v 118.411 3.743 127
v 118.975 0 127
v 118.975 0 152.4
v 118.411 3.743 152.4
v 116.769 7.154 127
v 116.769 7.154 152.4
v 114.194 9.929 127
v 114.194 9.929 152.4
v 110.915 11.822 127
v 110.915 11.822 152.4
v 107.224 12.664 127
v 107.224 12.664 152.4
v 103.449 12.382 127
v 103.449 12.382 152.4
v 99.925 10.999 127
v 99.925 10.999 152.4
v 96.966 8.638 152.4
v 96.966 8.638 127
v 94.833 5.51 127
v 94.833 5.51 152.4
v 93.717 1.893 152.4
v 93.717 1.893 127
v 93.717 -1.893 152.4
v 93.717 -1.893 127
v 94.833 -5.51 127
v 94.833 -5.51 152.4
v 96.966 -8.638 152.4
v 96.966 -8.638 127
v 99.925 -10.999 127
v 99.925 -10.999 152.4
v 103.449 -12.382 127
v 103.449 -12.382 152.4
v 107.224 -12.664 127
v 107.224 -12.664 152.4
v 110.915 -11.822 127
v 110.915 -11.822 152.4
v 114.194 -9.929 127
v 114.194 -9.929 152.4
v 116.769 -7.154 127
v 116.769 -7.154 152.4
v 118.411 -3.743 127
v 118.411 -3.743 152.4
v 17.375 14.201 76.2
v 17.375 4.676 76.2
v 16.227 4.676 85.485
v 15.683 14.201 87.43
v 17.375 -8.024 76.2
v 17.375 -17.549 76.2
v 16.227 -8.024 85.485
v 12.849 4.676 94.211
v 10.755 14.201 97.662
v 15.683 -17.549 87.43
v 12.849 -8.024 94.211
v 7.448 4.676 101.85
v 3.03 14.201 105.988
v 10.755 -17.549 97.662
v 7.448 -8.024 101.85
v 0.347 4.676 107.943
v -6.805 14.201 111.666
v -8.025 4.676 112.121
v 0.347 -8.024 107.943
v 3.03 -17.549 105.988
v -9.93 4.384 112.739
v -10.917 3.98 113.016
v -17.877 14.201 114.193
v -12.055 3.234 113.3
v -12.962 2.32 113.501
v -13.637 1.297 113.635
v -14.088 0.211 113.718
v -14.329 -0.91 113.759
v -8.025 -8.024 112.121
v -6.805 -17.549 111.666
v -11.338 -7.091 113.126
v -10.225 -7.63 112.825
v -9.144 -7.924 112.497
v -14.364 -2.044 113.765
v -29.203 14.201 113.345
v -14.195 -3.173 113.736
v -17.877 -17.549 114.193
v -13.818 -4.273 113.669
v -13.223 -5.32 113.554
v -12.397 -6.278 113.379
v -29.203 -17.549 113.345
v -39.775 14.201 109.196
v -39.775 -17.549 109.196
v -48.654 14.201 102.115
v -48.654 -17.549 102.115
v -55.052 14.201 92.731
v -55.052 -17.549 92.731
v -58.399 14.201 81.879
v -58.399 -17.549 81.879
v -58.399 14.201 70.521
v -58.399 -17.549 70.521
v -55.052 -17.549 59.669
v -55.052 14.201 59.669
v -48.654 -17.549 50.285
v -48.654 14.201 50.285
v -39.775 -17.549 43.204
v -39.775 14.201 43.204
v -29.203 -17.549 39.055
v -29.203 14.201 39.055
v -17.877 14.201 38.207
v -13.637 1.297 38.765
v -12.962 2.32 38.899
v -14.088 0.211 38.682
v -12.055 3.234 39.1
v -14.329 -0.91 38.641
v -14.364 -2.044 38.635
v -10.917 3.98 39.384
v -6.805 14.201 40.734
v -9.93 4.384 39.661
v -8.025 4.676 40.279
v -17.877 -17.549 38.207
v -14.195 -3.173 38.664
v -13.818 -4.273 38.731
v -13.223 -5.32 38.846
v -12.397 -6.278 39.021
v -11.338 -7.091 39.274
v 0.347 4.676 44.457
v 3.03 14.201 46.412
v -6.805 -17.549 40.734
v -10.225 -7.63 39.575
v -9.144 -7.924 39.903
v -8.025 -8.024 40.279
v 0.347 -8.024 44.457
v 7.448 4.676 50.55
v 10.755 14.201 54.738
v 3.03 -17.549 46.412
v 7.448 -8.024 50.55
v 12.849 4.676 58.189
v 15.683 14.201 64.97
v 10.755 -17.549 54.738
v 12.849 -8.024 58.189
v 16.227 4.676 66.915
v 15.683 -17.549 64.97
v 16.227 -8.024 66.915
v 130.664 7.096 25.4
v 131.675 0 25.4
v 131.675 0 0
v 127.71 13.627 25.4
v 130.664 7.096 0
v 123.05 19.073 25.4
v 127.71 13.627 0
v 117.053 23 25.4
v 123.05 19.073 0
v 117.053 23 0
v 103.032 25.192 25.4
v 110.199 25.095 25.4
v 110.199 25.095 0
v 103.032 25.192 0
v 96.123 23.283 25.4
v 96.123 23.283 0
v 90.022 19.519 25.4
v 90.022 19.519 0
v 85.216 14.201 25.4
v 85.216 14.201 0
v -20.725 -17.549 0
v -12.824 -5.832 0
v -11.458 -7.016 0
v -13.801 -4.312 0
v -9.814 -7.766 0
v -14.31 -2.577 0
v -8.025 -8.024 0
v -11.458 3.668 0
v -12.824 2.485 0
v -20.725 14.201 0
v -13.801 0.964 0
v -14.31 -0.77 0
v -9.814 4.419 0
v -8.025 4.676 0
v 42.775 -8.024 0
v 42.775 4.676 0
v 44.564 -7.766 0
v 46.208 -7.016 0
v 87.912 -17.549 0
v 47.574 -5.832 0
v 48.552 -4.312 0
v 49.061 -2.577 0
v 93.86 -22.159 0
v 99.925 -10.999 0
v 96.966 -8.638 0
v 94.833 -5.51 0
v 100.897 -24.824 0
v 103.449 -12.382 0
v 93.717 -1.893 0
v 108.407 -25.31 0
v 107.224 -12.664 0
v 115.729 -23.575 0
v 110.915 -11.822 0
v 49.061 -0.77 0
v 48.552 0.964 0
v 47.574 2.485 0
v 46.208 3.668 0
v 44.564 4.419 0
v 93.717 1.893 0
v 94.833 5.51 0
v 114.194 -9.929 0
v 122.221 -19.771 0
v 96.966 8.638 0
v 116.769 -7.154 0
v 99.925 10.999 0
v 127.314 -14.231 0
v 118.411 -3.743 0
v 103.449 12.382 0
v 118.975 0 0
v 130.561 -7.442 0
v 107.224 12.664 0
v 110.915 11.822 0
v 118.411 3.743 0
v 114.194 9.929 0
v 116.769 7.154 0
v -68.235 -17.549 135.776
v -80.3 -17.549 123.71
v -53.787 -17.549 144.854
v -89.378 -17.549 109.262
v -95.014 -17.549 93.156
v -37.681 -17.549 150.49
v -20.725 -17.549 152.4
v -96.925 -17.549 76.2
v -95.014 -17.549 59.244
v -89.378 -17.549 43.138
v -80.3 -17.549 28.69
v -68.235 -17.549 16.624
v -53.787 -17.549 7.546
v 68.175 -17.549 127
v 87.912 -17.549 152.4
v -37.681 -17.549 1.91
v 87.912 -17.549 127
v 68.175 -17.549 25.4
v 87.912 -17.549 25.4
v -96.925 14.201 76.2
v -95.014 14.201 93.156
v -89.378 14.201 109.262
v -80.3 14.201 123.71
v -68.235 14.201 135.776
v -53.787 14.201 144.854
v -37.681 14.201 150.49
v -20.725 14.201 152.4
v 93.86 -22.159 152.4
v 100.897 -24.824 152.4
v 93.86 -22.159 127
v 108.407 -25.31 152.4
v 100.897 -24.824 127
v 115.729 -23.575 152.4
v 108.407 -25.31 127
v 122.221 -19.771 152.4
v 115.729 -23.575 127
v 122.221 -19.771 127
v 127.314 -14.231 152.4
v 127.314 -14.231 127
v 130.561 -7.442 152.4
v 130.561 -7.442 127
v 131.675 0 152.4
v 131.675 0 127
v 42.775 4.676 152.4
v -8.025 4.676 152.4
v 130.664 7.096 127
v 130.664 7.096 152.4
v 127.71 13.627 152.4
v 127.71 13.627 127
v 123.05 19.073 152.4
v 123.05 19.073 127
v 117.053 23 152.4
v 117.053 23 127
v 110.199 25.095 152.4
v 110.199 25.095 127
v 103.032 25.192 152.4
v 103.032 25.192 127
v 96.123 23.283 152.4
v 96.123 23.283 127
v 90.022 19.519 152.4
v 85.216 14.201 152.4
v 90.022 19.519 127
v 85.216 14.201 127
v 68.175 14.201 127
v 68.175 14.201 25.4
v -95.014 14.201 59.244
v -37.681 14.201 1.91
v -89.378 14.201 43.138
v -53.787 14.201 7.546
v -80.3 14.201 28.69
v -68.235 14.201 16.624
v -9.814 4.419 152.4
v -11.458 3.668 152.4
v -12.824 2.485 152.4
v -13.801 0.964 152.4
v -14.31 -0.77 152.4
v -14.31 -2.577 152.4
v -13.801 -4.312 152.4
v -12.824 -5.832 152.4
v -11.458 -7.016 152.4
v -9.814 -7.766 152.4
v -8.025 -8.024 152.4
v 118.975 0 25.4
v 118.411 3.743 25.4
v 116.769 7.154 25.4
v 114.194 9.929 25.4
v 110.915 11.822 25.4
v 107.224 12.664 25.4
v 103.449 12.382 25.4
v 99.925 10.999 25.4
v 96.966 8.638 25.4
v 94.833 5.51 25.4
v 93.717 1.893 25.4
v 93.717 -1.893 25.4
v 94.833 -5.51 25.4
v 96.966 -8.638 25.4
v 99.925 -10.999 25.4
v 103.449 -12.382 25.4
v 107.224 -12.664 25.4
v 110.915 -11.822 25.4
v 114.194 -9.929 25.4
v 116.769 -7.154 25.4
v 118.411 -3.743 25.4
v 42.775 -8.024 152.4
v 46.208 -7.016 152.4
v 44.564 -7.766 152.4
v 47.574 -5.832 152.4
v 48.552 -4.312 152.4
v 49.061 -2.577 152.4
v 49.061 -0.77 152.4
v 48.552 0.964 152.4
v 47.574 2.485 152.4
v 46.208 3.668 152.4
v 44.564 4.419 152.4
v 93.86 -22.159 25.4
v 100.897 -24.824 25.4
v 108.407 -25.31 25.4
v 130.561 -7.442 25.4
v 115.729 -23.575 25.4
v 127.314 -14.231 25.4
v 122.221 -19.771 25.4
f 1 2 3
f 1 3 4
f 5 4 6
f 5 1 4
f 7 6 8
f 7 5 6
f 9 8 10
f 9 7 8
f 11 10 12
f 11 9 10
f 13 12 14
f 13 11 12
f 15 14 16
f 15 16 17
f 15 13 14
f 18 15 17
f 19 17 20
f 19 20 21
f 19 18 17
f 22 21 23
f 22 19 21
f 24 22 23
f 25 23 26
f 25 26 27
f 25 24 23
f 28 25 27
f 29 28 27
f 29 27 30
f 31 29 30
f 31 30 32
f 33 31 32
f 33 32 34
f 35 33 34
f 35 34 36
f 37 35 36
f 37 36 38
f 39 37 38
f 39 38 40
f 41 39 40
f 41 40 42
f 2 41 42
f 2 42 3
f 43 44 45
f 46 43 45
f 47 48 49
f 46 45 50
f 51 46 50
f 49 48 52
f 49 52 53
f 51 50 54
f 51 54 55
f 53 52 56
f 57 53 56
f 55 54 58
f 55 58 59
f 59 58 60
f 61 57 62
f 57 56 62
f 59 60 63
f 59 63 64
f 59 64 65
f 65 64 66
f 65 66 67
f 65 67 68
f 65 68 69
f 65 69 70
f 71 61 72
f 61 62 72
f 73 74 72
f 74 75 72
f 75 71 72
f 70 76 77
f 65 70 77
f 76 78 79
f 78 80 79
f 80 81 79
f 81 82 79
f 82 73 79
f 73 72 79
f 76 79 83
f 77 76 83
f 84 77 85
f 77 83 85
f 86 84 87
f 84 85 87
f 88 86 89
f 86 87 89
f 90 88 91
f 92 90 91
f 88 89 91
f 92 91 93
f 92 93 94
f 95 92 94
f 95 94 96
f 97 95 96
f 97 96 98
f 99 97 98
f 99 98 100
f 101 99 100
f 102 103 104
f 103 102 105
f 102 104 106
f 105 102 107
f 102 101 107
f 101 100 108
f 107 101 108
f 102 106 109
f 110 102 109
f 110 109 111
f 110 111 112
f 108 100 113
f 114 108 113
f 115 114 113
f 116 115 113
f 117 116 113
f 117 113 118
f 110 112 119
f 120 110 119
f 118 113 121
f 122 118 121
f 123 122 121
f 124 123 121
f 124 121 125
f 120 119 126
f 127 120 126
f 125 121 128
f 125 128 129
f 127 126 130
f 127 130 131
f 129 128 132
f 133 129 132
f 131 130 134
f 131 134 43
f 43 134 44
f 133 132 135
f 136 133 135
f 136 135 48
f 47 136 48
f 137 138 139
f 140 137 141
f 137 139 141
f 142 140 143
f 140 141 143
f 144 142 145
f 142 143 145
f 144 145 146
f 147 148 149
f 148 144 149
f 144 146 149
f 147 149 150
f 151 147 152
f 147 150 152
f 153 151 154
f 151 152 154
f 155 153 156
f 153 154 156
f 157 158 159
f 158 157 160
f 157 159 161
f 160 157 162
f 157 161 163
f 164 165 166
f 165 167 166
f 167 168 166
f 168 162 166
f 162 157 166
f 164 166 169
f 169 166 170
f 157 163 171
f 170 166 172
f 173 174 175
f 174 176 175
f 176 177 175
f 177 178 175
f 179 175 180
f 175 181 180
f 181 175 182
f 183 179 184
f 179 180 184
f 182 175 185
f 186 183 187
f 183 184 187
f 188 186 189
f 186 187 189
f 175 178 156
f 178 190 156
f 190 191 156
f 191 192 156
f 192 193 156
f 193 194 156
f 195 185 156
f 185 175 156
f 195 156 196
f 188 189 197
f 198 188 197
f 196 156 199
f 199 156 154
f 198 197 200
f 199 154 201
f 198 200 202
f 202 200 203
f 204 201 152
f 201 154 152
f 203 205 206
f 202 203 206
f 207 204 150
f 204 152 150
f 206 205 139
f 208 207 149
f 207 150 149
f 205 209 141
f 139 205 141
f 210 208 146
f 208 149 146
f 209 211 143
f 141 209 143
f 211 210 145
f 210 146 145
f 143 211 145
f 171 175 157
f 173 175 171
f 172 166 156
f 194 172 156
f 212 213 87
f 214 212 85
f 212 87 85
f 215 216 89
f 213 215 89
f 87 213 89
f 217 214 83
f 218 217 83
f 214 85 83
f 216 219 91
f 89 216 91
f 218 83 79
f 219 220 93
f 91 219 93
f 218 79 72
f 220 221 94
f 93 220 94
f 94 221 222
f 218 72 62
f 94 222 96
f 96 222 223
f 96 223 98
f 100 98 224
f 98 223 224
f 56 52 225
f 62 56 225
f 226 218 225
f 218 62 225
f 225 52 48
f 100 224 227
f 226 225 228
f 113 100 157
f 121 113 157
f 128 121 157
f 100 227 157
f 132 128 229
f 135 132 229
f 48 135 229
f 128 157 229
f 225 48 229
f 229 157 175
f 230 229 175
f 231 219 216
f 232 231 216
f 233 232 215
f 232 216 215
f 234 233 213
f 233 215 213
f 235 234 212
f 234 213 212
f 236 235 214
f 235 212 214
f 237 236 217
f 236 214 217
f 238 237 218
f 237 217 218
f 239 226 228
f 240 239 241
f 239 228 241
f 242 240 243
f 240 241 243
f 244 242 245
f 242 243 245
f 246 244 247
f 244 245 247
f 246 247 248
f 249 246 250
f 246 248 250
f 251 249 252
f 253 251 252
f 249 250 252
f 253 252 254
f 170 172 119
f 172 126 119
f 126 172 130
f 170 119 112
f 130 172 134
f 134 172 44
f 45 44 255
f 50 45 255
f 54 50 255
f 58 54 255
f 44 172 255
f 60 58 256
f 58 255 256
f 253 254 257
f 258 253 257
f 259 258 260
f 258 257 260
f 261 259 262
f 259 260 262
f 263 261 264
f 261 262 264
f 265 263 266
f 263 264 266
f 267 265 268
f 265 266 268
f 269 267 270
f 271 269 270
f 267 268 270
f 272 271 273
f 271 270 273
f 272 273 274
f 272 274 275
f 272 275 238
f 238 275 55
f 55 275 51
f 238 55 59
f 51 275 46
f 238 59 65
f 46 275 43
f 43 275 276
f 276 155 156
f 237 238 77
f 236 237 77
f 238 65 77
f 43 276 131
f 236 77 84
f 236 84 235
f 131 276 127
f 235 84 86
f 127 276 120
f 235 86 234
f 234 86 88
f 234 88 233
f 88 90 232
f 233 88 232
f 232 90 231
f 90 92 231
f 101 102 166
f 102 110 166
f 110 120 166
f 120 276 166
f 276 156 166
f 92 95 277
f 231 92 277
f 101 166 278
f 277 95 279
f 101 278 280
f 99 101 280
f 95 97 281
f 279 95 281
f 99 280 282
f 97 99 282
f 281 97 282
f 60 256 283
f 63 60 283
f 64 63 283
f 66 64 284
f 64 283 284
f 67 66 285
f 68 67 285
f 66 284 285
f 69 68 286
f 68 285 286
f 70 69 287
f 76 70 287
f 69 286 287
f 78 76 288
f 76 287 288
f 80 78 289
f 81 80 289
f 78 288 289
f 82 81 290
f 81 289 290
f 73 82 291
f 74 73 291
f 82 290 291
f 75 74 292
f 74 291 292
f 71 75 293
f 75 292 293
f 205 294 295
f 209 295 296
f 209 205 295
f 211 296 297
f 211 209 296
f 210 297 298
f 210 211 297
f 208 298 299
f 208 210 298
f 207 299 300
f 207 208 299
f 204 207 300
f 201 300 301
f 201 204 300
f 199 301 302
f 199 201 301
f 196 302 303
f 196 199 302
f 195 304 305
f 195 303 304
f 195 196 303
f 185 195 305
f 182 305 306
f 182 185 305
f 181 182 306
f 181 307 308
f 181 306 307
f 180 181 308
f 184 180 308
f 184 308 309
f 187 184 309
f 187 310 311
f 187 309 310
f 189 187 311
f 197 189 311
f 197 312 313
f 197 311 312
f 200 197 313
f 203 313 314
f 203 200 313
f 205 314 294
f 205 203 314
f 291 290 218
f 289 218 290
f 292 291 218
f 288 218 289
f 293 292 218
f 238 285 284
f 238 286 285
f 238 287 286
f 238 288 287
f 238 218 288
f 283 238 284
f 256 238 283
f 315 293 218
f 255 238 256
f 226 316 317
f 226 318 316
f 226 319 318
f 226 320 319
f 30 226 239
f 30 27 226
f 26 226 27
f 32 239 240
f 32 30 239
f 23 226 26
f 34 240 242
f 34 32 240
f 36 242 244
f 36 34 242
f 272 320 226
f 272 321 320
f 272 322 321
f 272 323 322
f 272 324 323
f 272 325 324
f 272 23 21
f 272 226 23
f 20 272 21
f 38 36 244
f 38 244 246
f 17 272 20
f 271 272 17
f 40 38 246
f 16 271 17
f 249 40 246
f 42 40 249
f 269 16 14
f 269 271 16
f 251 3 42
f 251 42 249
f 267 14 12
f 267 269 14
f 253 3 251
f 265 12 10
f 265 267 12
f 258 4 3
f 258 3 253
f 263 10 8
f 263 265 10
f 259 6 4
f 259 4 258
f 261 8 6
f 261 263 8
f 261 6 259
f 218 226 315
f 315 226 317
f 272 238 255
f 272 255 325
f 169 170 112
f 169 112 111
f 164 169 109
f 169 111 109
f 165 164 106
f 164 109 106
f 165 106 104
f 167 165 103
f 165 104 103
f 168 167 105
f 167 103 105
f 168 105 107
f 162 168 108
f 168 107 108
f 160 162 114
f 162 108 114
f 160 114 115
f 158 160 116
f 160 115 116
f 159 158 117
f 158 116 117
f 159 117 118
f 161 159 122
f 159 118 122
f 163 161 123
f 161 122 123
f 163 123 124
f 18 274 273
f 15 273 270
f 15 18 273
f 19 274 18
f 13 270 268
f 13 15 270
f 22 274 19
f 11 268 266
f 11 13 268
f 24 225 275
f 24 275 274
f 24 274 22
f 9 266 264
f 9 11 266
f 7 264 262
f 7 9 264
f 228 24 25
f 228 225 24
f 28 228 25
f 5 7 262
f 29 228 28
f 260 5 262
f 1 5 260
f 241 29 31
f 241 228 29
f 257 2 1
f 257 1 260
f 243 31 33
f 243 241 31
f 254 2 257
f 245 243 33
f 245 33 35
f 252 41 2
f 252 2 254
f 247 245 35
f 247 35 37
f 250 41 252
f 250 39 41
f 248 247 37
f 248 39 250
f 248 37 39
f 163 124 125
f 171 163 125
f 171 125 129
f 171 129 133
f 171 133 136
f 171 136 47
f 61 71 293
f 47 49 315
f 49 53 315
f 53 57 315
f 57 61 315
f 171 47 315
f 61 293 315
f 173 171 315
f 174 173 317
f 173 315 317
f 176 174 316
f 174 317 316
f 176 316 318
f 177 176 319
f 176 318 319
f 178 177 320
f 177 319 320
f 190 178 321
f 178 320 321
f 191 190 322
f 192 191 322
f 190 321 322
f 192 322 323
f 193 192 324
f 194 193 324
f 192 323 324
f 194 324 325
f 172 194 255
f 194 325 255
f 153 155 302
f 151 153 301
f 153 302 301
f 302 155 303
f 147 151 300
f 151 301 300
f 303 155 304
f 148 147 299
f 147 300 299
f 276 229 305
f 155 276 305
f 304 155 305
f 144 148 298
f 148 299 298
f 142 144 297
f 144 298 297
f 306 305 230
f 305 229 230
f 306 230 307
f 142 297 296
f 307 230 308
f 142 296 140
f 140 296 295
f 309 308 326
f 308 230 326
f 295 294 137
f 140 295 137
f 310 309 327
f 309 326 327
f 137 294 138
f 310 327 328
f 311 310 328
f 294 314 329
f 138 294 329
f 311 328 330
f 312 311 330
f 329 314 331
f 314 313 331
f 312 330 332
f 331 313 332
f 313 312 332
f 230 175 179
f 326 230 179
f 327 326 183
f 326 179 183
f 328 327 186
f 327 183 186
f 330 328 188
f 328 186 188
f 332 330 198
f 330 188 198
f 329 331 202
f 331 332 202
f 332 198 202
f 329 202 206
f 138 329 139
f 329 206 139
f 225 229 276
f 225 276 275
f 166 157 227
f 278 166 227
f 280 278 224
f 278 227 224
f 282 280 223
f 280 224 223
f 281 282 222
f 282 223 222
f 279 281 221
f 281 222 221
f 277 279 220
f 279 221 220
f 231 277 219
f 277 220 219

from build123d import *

# Parameters (mm, degrees)
F0_R     = 12.7
F1_DEPTH = 152.4
F2_R     = 38.1
F3_DEPTH = 42.949663
F5_DEPTH = 152.401
F6_W     = 157.67442
F6_H     = 101.6
F7_DEPTH = 838.2


with BuildPart() as f1:
    # F0 (on Top) → F1 (new body)
    with BuildSketch(Plane.XY):
        with BuildLine():
            ThreePointArc((87.912252, -17.548663), (115.728859, -23.575235), (131.675379, 0))
            ThreePointArc((131.675379, 0), (113.700373, 24.290522), (85.216366, 14.201337))
            ThreePointArc((85.216366, 14.201337), (80.96645, -2.148976), (87.912252, -17.548663))
        make_face()
        with Locations((106.275379, 0)):
            Circle(F0_R, mode=Mode.SUBTRACT)
        with BuildLine():
            ThreePointArc((87.912252, -17.548663), (80.96645, -2.148976), (85.216366, 14.201337))
            Line((85.216366, 14.201337), (-96.924621, 14.201337))
            Line((-96.924621, 14.201337), (-96.924621, -17.548663))
            Line((-96.924621, -17.548663), (87.912252, -17.548663))
        make_face()
    extrude(amount=F1_DEPTH)

    # F2 (on face) → F3 (cut, through all)
    with BuildSketch(Plane.XZ.offset(17.548663)):
        with BuildLine():
            ThreePointArc((-96.924621, 76.2), (-74.606158, 130.081537), (-20.724621, 152.4))
            Line((-20.724621, 152.4), (-96.924621, 152.4))
            Line((-96.924621, 152.4), (-96.924621, 76.2))
        make_face()
        with BuildLine():
            ThreePointArc((-20.724621, 0), (-74.606158, 22.318463), (-96.924621, 76.2))
            Line((-96.924621, 76.2), (-96.924621, 0))
            Line((-96.924621, 0), (-20.724621, 0))
        make_face()
        Polygon((-96.924621, 0), (-96.924621, 76.2), (-96.924621, 152.4), (-108.673256, 152.4), (-108.673256, 0), align=None)
        with Locations((-20.724621, 76.2)):
            Circle(F2_R)
    extrude(amount=-F3_DEPTH, mode=Mode.SUBTRACT)

    # F4 (on face) → F5 (cut, through all)
    with BuildSketch(Plane.XY.offset(152.4)):
        with BuildLine():
            Line((-8.024621, -8.023663), (42.775379, -8.023663))
            ThreePointArc((42.775379, -8.023663), (49.125379, -1.673663), (42.775379, 4.676337))
            Line((42.775379, 4.676337), (-8.024621, 4.676337))
            ThreePointArc((-8.024621, 4.676337), (-14.374621, -1.673663), (-8.024621, -8.023663))
        make_face()
    extrude(amount=-F5_DEPTH, mode=Mode.SUBTRACT)

    # F6 (on face) → F7 (cut, symmetric)
    with BuildSketch(Plane.XZ.offset(17.548663)):
        with Locations((147.012589, 76.2)):
            Rectangle(F6_W, F6_H)
    extrude(amount=F7_DEPTH, both=True, mode=Mode.SUBTRACT)


solid = f1.part
